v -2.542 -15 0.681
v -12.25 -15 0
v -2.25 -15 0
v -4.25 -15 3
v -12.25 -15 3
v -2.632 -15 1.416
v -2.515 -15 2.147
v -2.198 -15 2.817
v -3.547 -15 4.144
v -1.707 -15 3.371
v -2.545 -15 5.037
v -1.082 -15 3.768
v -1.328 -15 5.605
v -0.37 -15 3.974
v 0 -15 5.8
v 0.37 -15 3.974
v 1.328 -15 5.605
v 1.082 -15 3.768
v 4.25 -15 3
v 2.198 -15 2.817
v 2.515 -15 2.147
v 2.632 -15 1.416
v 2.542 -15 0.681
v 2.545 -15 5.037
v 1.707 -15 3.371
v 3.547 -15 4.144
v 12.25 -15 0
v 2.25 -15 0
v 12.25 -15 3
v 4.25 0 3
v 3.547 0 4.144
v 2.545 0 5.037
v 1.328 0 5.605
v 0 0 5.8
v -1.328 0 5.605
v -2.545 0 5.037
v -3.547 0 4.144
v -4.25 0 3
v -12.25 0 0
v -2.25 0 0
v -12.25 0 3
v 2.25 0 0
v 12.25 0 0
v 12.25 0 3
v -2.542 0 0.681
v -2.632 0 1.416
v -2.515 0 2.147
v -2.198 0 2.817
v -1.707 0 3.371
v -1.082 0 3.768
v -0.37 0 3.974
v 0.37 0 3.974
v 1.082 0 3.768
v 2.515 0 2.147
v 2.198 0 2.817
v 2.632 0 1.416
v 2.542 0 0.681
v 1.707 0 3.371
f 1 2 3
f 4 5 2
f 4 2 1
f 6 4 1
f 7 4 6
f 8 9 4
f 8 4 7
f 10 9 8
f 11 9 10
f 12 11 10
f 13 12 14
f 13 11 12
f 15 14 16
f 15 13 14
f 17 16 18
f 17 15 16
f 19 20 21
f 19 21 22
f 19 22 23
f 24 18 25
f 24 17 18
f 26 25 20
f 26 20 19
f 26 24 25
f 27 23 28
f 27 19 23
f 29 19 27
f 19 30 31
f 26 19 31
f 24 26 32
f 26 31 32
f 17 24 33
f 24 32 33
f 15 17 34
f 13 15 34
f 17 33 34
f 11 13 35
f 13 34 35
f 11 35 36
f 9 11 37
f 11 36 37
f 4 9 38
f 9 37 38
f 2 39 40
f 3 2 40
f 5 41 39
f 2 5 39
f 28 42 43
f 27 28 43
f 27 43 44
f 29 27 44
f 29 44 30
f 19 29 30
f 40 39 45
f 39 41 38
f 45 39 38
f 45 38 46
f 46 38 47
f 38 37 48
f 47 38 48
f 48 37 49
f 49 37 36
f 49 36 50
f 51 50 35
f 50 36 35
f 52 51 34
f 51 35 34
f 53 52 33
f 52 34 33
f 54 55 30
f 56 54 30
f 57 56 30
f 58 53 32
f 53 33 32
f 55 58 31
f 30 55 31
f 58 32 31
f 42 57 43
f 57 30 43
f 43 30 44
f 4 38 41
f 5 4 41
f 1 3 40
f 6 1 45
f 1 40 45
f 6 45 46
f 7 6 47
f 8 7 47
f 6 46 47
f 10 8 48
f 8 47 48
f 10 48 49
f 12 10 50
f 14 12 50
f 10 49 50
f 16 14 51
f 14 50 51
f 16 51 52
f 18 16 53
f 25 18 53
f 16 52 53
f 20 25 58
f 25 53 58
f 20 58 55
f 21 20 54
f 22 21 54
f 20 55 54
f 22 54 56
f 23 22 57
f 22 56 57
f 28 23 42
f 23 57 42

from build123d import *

# Parameters (mm, degrees)
F1_DEPTH = 15


with BuildPart() as f1:
    # F0 (on Front) → F1 (new body)
    with BuildSketch(Plane.XZ):
        with BuildLine():
            Line((-12.25, 3), (-12.25, 0))
            Line((-12.25, 0), (-2.25, 0))
            ThreePointArc((-2.25, 0), (0, 4), (2.25, 0))
            Line((2.25, 0), (12.25, 0))
            Line((12.25, 0), (12.25, 3))
            Line((12.25, 3), (4.25, 3))
            ThreePointArc((4.25, 3), (0, 5.8), (-4.25, 3))
            Line((-4.25, 3), (-12.25, 3))
        make_face()
    extrude(amount=F1_DEPTH)


solid = f1.part
